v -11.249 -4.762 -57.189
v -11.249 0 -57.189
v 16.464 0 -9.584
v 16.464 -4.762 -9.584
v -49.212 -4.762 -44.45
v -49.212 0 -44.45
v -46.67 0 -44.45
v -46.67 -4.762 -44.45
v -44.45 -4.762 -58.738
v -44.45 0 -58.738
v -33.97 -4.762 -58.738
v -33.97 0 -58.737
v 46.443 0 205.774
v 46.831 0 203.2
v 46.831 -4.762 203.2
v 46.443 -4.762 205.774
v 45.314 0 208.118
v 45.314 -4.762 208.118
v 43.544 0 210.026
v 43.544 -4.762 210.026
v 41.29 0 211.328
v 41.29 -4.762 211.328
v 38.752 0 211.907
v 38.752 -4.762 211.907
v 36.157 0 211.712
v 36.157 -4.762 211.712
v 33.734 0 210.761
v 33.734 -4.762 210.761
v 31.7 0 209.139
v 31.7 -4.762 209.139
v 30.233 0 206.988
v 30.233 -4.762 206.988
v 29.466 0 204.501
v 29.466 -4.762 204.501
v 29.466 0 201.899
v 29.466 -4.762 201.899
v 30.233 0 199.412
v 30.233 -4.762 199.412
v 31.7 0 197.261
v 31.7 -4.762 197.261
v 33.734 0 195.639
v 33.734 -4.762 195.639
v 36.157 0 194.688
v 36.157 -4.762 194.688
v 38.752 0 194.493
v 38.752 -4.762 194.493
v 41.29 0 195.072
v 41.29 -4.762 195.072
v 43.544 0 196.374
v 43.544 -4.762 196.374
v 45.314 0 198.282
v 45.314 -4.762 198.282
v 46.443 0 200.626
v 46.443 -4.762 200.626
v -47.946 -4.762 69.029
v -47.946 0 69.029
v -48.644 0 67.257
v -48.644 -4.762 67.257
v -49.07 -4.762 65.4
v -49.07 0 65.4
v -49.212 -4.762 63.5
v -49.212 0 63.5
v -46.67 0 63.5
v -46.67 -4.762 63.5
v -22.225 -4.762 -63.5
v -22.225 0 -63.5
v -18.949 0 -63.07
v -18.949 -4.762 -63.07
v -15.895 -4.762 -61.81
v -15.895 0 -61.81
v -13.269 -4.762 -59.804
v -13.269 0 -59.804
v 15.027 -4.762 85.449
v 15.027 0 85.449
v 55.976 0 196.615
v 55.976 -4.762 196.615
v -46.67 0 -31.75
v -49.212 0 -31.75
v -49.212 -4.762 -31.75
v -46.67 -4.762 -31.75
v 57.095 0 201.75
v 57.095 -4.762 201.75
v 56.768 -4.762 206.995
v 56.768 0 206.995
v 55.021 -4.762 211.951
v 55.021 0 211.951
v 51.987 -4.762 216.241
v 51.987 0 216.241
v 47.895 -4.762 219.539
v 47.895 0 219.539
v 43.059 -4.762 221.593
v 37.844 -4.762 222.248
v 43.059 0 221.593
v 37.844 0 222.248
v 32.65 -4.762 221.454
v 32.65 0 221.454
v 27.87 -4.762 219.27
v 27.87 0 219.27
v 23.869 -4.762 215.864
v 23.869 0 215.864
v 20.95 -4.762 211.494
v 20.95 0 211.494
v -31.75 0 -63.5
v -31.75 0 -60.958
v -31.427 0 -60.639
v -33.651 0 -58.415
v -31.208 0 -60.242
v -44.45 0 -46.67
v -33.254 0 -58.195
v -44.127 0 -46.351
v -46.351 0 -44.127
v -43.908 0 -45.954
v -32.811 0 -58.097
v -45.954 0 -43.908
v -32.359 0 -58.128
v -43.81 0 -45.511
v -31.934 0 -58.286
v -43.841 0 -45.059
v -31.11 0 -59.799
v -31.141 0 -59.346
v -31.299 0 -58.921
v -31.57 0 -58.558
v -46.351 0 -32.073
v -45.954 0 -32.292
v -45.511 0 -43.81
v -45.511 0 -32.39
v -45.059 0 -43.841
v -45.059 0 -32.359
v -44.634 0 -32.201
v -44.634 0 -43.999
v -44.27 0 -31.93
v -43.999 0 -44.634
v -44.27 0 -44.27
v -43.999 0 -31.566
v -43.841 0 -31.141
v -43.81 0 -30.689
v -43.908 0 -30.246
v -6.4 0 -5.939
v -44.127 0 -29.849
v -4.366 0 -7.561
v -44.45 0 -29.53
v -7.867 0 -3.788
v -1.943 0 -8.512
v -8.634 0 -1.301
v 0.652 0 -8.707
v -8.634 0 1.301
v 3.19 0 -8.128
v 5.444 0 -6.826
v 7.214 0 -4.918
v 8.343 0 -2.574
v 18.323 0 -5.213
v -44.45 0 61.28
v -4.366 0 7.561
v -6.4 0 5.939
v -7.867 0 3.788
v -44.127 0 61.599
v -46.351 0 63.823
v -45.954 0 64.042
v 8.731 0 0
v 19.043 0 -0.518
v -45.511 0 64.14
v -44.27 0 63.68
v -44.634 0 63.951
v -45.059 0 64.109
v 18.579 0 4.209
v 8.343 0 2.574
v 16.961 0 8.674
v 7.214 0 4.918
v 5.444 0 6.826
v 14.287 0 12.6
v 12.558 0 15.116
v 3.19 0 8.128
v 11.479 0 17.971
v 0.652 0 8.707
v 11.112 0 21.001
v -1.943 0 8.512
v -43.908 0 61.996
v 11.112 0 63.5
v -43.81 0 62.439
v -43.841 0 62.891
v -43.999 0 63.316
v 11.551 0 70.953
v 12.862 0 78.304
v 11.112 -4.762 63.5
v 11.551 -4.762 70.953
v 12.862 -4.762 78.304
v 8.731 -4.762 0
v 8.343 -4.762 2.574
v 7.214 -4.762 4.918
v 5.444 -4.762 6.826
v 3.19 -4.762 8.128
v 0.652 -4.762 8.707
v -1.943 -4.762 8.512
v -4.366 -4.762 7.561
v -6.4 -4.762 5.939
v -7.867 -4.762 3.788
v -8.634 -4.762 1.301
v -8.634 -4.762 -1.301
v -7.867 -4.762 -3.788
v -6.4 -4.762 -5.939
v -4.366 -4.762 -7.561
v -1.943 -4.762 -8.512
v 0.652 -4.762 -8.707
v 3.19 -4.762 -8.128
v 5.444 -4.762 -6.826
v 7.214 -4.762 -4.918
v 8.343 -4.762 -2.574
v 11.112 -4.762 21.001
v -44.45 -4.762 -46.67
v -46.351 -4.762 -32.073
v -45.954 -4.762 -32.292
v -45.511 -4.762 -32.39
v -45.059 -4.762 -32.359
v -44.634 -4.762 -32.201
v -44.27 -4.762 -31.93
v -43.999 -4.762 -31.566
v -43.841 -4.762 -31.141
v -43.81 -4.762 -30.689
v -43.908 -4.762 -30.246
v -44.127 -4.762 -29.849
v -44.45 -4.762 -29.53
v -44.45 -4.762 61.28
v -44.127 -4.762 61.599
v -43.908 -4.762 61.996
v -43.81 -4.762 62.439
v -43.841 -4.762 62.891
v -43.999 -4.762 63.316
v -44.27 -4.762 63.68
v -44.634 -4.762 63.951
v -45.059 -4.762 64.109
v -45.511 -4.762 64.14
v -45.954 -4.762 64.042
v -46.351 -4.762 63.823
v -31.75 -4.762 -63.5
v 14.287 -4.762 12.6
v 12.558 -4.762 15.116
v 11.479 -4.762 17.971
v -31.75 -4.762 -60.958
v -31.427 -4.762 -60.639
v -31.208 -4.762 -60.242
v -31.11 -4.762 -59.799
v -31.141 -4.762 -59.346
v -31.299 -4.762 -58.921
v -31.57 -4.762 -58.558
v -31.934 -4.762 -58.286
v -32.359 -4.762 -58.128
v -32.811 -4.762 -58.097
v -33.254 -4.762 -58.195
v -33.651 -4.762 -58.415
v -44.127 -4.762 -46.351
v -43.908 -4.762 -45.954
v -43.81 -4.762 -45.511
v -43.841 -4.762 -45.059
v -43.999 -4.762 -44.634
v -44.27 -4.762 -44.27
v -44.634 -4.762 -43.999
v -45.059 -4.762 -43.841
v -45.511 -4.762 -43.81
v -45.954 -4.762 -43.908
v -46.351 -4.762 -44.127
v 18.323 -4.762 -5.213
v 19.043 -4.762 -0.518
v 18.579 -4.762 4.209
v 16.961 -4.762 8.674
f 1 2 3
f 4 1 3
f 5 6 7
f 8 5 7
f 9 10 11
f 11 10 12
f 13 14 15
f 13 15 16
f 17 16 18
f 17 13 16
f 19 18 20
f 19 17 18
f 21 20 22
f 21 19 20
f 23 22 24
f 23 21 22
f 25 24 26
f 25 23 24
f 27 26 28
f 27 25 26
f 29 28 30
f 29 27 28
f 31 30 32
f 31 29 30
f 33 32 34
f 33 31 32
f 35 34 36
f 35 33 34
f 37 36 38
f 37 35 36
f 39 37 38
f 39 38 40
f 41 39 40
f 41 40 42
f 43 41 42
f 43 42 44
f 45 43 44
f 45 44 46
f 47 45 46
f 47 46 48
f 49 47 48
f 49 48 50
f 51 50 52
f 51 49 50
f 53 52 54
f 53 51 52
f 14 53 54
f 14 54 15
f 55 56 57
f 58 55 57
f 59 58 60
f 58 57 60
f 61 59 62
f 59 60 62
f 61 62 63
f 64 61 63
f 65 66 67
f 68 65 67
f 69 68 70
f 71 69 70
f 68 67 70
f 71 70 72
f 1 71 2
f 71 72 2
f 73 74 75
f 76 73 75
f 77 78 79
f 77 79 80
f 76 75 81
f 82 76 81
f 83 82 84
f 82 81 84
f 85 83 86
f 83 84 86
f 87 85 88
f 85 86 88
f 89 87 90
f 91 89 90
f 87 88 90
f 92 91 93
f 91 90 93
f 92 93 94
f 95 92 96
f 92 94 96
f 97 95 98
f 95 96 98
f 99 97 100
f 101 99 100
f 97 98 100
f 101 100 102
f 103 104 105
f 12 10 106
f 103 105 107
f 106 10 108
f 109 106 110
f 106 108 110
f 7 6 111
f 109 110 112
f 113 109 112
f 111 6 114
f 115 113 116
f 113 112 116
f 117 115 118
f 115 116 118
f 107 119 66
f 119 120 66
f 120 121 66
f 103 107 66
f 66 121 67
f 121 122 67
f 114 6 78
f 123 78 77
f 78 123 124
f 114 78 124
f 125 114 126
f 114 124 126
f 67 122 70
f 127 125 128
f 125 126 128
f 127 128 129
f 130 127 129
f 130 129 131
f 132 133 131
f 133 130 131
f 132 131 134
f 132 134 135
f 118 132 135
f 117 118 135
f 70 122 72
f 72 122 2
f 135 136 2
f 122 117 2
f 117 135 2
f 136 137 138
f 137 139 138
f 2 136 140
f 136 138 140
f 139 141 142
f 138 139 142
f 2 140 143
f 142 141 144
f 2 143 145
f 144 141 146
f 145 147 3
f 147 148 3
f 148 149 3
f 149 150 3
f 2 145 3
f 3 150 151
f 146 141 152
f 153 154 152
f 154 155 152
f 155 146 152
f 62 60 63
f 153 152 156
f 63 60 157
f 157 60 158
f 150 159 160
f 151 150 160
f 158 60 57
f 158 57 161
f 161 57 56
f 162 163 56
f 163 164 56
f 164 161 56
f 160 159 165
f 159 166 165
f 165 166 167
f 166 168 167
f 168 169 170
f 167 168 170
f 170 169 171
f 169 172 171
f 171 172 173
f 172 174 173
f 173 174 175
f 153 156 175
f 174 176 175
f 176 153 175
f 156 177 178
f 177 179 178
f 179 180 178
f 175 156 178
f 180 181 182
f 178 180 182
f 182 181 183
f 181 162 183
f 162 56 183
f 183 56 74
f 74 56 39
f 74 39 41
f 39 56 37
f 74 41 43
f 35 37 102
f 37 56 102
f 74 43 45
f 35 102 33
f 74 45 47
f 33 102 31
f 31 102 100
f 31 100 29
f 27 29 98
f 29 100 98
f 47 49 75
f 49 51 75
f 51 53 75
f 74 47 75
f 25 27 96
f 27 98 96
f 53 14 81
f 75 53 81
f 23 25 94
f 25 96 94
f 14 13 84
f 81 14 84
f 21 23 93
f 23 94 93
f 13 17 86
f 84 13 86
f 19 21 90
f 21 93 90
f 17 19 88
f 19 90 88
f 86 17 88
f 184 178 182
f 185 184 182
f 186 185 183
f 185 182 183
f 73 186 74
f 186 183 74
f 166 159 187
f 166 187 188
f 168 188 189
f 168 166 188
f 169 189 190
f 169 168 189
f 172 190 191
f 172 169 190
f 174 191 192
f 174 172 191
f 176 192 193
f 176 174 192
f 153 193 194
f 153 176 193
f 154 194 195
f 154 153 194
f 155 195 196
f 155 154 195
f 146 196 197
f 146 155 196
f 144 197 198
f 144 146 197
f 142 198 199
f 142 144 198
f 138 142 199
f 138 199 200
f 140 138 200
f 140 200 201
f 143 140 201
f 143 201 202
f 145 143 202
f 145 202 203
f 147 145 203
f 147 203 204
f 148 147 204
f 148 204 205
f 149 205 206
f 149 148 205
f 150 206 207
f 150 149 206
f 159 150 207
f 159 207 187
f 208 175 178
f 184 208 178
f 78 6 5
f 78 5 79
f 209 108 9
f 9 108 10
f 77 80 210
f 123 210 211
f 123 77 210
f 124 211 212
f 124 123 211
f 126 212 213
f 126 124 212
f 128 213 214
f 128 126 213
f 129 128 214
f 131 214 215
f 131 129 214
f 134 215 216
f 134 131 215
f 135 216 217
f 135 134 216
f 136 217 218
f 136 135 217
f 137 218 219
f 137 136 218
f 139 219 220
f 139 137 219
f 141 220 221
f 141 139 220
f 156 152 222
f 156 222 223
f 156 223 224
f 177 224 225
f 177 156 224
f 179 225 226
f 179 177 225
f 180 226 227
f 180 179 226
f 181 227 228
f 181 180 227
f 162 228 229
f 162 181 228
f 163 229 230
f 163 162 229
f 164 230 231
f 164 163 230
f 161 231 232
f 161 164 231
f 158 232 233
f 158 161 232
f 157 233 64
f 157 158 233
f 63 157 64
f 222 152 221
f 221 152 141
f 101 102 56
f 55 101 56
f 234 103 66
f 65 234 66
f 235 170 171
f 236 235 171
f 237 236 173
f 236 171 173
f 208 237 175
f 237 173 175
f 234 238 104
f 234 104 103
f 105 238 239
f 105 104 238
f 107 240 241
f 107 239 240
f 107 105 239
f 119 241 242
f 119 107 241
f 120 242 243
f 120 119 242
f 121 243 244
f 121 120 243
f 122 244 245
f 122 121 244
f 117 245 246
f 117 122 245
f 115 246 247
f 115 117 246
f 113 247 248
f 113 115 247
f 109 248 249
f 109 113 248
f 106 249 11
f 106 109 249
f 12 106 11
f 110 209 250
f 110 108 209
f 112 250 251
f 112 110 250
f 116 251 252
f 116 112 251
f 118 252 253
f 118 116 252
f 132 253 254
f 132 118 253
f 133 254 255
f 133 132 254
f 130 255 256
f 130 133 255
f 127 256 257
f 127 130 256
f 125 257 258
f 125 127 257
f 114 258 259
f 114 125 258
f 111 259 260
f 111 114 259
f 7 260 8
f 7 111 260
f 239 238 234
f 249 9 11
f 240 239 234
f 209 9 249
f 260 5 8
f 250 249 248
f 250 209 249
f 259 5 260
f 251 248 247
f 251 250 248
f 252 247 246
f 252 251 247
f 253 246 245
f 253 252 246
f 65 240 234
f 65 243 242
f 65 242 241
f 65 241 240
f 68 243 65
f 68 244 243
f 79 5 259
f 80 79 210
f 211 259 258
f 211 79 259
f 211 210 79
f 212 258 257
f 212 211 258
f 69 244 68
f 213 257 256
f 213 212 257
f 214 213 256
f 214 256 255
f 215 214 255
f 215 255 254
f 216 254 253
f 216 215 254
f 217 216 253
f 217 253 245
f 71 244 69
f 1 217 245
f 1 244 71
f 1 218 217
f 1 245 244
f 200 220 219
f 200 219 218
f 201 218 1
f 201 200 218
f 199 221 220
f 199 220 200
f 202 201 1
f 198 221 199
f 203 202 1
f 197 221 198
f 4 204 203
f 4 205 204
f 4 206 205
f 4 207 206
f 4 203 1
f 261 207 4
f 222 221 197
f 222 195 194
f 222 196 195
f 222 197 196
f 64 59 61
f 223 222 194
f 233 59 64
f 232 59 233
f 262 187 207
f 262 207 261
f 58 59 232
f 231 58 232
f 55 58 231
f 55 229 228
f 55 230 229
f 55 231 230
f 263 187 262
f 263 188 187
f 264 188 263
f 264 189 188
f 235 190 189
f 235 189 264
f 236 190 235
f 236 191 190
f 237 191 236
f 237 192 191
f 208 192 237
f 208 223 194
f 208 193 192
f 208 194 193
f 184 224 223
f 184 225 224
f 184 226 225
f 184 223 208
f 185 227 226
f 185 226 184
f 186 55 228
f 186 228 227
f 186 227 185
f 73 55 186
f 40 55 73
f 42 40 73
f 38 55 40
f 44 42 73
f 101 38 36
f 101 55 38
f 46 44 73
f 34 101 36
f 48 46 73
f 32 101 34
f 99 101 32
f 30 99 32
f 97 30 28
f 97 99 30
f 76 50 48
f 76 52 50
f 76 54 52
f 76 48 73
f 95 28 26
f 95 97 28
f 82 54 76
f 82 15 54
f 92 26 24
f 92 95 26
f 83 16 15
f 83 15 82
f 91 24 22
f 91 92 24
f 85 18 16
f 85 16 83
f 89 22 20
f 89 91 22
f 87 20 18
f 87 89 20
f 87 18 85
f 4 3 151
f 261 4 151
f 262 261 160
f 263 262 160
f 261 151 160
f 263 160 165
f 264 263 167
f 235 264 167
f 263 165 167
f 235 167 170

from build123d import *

# Parameters (mm, degrees)
F0_R     = 8.73125
F1_DEPTH = 4.7625
F2_W     = 4.7625
F2_H     = 12.7
F3_DEPTH = 4.7625
F4_R     = 1.5875
F5_DEPTH = 4.7635


with BuildPart() as f1:
    # F0 (on Front) → F1 (new body)
    with BuildSketch(Plane.XZ):
        with BuildLine():
            Line((-49.2125, 63.5), (-44.45, 63.5))
            Line((-44.45, 63.5), (-44.45, -58.7375))
            Line((-44.45, -58.7375), (-31.75, -58.7375))
            Line((-31.75, -58.7375), (-31.75, -63.5))
            Line((-31.75, -63.5), (-22.225, -63.5))
            ThreePointArc((-22.225, -63.5), (-15.894715, -61.809881), (-11.249301, -57.189368))
            Line((-11.249301, -57.189368), (16.463549, -9.584053))
            ThreePointArc((16.463549, -9.584053), (18.959012, 1.85967), (14.2875, 12.600391))
            ThreePointArc((14.2875, 12.600391), (11.932738, 16.510523), (11.1125, 21.000651))
            Line((11.1125, 21.000651), (11.1125, 63.5))
            ThreePointArc((11.1125, 63.5), (12.098669, 74.647689), (15.026546, 85.449126))
            Line((15.026546, 85.449126), (55.975786, 196.615262))
            ThreePointArc((55.975786, 196.615262), (45.548054, 220.733653), (20.950146, 211.493672))
            Line((20.950146, 211.493672), (-47.945736, 69.029115))
            ThreePointArc((-47.945736, 69.029115), (-48.891759, 66.336186), (-49.2125, 63.5))
        make_face()
        Circle(F0_R, mode=Mode.SUBTRACT)
        with Locations((38.1, 203.2)):
            Circle(F0_R, mode=Mode.SUBTRACT)
    extrude(amount=F1_DEPTH)

    # F2 (on Front) → F3 (join, through all)
    with BuildSketch(Plane.XZ):
        with Locations((-46.83125, -38.1)):
            Rectangle(F2_W, F2_H)
    extrude(amount=F3_DEPTH)

    # F4 (on Front) → F5 (cut, through all)
    with BuildSketch(Plane.XZ):
        with Locations((-45.392927, 62.557073)):
            Circle(F4_R)
        with Locations((-32.692927, -59.680427)):
            Circle(F4_R)
        with Locations((-45.392927, -45.392927)):
            Circle(F4_R)
        with Locations((-45.392927, -30.807073)):
            Circle(F4_R)
    extrude(amount=F5_DEPTH, mode=Mode.SUBTRACT)


solid = f1.part
